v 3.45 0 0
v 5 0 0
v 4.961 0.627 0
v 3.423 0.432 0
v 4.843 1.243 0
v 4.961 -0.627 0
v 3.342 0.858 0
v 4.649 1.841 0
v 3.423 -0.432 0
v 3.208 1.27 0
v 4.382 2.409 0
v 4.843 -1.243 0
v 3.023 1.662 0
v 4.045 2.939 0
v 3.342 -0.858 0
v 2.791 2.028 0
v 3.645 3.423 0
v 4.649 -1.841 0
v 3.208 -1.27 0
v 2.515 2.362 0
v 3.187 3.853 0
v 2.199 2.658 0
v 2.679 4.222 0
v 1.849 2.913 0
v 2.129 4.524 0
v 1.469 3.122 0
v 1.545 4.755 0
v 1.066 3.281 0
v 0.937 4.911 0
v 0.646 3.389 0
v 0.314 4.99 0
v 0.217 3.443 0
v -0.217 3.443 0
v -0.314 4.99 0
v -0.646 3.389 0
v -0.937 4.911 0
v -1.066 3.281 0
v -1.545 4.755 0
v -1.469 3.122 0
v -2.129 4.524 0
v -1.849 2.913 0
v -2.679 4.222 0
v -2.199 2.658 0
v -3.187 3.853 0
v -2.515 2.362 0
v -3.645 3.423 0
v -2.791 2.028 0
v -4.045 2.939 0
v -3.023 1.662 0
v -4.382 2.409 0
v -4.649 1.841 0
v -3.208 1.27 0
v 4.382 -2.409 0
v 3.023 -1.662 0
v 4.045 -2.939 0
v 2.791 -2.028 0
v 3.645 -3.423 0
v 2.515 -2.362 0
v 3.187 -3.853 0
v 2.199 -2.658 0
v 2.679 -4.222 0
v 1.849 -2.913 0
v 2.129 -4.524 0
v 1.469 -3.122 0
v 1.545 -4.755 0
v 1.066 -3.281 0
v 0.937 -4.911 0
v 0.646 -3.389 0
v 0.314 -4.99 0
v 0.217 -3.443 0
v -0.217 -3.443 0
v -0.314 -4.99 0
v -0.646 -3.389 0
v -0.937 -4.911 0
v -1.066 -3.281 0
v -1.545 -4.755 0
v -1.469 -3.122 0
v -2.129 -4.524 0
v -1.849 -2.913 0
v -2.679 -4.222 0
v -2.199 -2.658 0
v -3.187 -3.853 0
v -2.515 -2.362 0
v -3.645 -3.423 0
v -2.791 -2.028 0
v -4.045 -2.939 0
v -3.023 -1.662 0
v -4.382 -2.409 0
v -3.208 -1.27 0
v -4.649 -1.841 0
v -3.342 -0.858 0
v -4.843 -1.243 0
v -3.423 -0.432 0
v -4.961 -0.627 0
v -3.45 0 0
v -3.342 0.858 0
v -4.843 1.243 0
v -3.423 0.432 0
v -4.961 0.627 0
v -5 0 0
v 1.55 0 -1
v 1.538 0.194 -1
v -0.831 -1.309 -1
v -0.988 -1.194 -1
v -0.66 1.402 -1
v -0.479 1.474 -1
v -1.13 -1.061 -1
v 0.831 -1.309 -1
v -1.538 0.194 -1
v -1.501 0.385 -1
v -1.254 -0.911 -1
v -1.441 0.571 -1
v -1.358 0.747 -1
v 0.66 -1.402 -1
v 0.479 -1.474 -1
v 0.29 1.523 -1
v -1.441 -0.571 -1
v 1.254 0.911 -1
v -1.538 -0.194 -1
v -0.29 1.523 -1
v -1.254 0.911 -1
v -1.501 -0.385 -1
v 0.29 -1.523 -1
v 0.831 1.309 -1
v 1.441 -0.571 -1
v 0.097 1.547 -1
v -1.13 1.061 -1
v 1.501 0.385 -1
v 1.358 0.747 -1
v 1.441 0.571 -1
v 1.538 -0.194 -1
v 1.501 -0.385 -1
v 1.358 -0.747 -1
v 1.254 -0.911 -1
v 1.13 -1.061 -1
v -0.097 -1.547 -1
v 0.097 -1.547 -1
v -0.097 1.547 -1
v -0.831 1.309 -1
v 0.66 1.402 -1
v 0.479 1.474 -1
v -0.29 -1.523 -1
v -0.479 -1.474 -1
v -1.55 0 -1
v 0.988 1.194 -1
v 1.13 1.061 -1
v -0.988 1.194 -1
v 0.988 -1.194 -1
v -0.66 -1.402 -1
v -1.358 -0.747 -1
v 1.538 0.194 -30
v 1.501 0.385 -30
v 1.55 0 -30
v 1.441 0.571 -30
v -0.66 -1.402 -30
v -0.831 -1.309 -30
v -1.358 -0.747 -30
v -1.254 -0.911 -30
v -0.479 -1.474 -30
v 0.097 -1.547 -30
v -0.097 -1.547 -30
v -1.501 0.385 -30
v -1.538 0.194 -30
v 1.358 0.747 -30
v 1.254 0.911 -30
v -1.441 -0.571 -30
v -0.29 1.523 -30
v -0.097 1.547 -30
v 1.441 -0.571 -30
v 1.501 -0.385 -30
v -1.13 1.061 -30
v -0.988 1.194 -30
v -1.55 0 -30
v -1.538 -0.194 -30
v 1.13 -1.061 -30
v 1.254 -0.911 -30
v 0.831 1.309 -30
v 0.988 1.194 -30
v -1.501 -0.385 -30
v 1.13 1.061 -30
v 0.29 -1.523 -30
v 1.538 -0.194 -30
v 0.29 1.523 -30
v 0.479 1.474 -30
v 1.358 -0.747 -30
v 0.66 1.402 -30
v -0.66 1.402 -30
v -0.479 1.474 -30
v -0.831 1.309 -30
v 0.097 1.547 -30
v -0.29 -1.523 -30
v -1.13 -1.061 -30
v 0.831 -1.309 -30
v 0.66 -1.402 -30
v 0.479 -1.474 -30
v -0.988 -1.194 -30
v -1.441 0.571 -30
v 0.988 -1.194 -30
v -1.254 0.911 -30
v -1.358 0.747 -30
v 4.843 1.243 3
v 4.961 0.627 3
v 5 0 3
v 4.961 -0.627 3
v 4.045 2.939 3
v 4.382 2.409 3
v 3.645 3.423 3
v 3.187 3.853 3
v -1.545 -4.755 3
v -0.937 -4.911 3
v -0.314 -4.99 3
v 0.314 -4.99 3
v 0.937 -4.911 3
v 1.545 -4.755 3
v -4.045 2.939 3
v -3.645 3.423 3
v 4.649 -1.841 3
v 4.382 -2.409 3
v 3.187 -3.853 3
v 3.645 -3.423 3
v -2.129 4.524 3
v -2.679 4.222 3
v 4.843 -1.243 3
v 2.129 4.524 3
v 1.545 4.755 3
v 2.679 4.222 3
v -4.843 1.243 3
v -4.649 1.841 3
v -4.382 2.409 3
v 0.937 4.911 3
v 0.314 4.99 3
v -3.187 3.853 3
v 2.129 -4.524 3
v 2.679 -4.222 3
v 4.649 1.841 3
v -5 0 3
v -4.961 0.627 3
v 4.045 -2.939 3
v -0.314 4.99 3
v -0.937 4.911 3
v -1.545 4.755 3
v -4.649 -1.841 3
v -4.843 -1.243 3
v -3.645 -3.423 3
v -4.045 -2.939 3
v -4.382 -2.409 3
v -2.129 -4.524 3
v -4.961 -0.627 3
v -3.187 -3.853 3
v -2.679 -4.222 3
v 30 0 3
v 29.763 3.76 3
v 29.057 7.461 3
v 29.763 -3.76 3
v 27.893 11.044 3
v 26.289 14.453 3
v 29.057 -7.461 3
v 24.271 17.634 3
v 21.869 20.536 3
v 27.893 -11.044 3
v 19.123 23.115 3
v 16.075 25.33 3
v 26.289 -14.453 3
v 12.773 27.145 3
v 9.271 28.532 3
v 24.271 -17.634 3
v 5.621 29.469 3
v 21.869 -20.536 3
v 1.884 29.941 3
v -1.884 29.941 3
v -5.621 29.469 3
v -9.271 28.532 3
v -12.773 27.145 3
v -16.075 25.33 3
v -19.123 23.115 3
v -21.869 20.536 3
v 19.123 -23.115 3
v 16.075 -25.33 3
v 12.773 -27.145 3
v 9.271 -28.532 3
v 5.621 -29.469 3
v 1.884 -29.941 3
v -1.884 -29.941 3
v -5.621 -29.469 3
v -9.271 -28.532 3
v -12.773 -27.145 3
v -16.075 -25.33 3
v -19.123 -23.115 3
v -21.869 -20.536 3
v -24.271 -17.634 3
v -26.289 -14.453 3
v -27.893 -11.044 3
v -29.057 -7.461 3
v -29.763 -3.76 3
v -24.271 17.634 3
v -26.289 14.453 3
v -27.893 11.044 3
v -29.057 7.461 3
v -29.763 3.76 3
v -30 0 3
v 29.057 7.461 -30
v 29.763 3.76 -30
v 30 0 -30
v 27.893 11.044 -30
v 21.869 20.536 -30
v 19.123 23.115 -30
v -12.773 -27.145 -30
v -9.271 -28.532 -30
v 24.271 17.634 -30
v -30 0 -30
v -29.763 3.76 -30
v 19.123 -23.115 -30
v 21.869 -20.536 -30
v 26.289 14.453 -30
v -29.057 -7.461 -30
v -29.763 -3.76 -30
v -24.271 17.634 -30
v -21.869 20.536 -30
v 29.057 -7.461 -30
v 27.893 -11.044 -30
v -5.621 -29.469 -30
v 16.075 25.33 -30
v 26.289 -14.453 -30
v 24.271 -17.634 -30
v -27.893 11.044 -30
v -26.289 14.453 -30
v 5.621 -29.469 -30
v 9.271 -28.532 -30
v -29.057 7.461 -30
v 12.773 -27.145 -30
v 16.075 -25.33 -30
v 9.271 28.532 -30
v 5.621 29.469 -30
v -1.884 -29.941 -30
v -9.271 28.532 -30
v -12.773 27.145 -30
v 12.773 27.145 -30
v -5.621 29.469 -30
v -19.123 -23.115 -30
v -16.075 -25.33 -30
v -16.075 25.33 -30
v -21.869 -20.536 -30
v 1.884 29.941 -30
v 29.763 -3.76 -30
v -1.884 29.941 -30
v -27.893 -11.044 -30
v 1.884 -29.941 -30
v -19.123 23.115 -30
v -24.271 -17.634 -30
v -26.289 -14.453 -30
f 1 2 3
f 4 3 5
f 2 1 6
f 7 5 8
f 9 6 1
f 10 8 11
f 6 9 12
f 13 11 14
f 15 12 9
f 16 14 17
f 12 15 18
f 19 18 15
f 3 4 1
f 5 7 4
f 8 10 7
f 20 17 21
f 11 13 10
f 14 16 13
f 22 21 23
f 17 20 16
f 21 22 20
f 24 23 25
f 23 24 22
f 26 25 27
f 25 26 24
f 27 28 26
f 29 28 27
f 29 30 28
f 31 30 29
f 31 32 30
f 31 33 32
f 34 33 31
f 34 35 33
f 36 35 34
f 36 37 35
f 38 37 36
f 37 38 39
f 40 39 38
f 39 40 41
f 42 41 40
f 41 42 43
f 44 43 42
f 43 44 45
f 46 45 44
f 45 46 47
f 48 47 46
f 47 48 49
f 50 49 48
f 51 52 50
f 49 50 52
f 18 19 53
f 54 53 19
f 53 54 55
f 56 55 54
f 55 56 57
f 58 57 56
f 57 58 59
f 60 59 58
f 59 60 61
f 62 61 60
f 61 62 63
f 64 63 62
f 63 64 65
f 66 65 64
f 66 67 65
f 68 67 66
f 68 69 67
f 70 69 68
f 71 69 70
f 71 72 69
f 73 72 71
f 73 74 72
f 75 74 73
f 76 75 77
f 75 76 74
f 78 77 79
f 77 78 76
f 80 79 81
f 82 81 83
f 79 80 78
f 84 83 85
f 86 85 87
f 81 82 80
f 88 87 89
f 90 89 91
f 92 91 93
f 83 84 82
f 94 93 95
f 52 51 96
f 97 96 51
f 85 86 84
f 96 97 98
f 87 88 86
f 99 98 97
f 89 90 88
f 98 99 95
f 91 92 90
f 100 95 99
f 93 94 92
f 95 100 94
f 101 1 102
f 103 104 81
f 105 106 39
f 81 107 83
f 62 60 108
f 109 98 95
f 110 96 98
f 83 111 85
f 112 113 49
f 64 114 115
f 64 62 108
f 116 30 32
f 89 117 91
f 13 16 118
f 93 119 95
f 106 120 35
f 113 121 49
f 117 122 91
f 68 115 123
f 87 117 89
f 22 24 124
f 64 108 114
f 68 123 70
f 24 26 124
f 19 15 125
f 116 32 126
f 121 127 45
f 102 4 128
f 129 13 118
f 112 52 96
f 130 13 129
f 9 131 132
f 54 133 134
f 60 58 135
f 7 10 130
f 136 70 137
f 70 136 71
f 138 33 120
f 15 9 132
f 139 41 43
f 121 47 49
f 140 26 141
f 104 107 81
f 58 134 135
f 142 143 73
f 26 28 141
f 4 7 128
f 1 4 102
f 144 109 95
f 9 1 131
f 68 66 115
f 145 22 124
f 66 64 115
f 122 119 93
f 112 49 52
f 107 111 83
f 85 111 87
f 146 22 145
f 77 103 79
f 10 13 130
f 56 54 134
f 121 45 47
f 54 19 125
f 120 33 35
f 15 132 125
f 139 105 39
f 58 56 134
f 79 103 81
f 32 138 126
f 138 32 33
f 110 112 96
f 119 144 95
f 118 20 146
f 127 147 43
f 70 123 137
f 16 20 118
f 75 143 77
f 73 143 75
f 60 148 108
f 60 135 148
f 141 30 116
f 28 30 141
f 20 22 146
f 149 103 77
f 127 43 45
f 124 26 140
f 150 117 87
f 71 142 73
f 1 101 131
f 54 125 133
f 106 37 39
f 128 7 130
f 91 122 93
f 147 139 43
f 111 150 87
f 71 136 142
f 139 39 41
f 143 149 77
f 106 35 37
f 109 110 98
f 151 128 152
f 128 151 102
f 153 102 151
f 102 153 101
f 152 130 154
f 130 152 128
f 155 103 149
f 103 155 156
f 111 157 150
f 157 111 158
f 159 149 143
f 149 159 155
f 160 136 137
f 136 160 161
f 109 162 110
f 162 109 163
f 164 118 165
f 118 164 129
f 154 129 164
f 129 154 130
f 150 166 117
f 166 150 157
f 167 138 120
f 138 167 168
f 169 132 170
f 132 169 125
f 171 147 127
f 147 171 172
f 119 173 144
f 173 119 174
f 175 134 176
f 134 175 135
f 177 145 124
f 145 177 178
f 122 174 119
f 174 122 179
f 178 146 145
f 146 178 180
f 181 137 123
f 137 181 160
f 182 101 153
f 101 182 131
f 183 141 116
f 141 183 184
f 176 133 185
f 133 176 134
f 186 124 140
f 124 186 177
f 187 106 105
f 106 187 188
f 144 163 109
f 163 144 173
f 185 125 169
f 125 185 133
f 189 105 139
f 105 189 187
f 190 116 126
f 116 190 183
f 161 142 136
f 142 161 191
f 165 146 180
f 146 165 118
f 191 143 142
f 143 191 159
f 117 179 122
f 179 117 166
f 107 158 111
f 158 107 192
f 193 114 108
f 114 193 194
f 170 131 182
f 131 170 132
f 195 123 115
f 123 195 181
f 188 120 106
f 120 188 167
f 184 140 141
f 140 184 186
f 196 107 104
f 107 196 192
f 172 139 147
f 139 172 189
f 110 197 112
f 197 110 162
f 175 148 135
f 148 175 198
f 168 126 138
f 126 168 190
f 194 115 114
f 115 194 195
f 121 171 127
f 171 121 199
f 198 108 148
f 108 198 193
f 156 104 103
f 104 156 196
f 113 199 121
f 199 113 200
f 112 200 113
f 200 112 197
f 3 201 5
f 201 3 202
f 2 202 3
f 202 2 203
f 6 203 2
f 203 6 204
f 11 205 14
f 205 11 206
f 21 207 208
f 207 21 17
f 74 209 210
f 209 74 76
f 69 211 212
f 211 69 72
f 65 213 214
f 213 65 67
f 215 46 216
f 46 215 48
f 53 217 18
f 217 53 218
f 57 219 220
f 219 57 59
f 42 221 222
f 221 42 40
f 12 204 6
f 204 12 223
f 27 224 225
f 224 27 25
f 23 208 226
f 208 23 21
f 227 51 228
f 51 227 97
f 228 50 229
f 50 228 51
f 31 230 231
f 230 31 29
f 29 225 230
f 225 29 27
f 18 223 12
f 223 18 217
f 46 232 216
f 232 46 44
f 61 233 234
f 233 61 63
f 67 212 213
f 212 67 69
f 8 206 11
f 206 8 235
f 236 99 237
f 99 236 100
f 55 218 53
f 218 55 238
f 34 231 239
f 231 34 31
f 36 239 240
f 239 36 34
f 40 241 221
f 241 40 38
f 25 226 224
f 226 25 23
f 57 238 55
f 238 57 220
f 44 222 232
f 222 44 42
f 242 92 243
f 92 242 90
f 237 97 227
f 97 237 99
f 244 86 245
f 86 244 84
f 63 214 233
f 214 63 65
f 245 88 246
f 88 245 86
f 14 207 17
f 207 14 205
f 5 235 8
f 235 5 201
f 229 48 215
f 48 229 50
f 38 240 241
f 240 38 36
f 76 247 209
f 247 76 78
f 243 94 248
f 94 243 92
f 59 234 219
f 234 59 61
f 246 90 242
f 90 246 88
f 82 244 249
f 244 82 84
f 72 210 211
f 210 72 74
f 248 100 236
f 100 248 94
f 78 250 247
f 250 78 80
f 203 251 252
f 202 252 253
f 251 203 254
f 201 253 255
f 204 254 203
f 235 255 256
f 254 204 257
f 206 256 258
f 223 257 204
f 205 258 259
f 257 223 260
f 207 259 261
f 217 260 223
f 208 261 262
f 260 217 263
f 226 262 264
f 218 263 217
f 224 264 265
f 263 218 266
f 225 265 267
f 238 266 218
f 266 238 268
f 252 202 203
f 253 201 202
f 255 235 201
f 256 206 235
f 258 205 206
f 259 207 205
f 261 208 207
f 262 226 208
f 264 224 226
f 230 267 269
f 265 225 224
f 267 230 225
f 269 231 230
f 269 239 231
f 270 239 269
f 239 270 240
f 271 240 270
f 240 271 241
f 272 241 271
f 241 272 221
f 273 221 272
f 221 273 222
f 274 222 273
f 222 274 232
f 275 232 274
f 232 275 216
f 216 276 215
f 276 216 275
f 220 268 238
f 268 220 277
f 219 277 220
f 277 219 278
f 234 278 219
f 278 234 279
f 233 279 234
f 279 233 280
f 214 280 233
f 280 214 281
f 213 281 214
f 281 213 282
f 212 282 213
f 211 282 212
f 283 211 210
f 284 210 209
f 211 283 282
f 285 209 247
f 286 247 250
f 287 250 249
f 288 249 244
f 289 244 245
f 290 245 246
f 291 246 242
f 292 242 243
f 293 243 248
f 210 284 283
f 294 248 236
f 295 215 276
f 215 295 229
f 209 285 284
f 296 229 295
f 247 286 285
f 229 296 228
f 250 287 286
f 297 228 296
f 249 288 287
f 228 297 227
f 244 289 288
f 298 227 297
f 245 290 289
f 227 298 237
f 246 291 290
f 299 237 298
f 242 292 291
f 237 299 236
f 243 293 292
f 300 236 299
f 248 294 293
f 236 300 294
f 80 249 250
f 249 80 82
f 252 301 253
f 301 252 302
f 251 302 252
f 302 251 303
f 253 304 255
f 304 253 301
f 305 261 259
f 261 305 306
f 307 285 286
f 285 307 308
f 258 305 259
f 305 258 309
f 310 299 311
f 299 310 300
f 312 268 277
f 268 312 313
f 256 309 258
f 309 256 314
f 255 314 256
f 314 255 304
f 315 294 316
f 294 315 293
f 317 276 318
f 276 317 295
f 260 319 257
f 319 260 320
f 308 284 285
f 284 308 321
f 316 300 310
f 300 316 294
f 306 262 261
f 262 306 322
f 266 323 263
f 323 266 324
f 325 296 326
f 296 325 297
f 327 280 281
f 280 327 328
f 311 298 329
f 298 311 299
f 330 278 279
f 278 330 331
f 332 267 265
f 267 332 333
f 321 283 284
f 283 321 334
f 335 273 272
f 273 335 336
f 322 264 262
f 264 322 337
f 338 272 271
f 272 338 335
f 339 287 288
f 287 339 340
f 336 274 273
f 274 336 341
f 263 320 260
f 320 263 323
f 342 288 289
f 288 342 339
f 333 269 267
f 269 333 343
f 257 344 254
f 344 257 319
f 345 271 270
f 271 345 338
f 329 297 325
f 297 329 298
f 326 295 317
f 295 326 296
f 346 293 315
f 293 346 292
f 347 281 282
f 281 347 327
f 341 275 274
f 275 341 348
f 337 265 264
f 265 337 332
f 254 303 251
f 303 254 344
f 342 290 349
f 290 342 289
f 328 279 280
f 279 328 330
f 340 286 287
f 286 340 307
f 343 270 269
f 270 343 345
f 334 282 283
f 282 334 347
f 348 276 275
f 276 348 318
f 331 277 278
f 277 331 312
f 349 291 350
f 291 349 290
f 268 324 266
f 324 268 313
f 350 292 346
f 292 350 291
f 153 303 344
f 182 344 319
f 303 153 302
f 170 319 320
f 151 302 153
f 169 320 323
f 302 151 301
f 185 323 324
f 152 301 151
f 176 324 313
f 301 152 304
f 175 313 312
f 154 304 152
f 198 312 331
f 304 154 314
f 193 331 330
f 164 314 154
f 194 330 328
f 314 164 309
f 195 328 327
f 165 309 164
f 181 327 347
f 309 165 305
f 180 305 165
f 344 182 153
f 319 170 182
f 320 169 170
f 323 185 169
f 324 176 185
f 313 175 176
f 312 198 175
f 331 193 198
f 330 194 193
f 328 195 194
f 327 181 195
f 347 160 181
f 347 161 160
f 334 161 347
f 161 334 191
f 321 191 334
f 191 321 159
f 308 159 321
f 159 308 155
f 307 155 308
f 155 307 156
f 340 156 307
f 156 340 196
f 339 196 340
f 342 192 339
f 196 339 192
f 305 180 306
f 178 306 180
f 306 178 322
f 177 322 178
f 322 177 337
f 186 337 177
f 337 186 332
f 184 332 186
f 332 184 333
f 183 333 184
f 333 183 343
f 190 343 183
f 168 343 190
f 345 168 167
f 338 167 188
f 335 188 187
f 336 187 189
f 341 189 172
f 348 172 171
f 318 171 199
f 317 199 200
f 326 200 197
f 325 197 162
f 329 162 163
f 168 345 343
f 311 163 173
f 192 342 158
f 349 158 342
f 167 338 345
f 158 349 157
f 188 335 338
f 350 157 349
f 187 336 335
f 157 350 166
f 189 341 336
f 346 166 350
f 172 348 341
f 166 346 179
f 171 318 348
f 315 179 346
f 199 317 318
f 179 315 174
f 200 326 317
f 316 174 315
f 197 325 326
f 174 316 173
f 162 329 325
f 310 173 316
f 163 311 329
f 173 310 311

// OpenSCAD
$fn = 50;

difference() {
	union() {
		translate(v = [0, 0, -30.0]) {
			cylinder(h = 33, r = 30.0);
		}
	}
	union() {
		translate(v = [0, 0, 0]) {
			rotate(a = [0, 0, 0]) {
				difference() {
					union() {
						translate(v = [0, 0, -33.0]) {
							cylinder(h = 33, r = 1.25);
						}
						translate(v = [0, 0, -1.0]) {
							cylinder(h = 1.0, r1 = 1.55, r2 = 3.45);
						}
						translate(v = [0, 0, -33.0]) {
							cylinder(h = 33, r = 1.55);
						}
						translate(v = [0, 0, -33.0]) {
							cylinder(h = 33, r = 1.25);
						}
					}
					union();
				}
			}
		}
		#cylinder(h = 3, r = 5.0);
	}
}
